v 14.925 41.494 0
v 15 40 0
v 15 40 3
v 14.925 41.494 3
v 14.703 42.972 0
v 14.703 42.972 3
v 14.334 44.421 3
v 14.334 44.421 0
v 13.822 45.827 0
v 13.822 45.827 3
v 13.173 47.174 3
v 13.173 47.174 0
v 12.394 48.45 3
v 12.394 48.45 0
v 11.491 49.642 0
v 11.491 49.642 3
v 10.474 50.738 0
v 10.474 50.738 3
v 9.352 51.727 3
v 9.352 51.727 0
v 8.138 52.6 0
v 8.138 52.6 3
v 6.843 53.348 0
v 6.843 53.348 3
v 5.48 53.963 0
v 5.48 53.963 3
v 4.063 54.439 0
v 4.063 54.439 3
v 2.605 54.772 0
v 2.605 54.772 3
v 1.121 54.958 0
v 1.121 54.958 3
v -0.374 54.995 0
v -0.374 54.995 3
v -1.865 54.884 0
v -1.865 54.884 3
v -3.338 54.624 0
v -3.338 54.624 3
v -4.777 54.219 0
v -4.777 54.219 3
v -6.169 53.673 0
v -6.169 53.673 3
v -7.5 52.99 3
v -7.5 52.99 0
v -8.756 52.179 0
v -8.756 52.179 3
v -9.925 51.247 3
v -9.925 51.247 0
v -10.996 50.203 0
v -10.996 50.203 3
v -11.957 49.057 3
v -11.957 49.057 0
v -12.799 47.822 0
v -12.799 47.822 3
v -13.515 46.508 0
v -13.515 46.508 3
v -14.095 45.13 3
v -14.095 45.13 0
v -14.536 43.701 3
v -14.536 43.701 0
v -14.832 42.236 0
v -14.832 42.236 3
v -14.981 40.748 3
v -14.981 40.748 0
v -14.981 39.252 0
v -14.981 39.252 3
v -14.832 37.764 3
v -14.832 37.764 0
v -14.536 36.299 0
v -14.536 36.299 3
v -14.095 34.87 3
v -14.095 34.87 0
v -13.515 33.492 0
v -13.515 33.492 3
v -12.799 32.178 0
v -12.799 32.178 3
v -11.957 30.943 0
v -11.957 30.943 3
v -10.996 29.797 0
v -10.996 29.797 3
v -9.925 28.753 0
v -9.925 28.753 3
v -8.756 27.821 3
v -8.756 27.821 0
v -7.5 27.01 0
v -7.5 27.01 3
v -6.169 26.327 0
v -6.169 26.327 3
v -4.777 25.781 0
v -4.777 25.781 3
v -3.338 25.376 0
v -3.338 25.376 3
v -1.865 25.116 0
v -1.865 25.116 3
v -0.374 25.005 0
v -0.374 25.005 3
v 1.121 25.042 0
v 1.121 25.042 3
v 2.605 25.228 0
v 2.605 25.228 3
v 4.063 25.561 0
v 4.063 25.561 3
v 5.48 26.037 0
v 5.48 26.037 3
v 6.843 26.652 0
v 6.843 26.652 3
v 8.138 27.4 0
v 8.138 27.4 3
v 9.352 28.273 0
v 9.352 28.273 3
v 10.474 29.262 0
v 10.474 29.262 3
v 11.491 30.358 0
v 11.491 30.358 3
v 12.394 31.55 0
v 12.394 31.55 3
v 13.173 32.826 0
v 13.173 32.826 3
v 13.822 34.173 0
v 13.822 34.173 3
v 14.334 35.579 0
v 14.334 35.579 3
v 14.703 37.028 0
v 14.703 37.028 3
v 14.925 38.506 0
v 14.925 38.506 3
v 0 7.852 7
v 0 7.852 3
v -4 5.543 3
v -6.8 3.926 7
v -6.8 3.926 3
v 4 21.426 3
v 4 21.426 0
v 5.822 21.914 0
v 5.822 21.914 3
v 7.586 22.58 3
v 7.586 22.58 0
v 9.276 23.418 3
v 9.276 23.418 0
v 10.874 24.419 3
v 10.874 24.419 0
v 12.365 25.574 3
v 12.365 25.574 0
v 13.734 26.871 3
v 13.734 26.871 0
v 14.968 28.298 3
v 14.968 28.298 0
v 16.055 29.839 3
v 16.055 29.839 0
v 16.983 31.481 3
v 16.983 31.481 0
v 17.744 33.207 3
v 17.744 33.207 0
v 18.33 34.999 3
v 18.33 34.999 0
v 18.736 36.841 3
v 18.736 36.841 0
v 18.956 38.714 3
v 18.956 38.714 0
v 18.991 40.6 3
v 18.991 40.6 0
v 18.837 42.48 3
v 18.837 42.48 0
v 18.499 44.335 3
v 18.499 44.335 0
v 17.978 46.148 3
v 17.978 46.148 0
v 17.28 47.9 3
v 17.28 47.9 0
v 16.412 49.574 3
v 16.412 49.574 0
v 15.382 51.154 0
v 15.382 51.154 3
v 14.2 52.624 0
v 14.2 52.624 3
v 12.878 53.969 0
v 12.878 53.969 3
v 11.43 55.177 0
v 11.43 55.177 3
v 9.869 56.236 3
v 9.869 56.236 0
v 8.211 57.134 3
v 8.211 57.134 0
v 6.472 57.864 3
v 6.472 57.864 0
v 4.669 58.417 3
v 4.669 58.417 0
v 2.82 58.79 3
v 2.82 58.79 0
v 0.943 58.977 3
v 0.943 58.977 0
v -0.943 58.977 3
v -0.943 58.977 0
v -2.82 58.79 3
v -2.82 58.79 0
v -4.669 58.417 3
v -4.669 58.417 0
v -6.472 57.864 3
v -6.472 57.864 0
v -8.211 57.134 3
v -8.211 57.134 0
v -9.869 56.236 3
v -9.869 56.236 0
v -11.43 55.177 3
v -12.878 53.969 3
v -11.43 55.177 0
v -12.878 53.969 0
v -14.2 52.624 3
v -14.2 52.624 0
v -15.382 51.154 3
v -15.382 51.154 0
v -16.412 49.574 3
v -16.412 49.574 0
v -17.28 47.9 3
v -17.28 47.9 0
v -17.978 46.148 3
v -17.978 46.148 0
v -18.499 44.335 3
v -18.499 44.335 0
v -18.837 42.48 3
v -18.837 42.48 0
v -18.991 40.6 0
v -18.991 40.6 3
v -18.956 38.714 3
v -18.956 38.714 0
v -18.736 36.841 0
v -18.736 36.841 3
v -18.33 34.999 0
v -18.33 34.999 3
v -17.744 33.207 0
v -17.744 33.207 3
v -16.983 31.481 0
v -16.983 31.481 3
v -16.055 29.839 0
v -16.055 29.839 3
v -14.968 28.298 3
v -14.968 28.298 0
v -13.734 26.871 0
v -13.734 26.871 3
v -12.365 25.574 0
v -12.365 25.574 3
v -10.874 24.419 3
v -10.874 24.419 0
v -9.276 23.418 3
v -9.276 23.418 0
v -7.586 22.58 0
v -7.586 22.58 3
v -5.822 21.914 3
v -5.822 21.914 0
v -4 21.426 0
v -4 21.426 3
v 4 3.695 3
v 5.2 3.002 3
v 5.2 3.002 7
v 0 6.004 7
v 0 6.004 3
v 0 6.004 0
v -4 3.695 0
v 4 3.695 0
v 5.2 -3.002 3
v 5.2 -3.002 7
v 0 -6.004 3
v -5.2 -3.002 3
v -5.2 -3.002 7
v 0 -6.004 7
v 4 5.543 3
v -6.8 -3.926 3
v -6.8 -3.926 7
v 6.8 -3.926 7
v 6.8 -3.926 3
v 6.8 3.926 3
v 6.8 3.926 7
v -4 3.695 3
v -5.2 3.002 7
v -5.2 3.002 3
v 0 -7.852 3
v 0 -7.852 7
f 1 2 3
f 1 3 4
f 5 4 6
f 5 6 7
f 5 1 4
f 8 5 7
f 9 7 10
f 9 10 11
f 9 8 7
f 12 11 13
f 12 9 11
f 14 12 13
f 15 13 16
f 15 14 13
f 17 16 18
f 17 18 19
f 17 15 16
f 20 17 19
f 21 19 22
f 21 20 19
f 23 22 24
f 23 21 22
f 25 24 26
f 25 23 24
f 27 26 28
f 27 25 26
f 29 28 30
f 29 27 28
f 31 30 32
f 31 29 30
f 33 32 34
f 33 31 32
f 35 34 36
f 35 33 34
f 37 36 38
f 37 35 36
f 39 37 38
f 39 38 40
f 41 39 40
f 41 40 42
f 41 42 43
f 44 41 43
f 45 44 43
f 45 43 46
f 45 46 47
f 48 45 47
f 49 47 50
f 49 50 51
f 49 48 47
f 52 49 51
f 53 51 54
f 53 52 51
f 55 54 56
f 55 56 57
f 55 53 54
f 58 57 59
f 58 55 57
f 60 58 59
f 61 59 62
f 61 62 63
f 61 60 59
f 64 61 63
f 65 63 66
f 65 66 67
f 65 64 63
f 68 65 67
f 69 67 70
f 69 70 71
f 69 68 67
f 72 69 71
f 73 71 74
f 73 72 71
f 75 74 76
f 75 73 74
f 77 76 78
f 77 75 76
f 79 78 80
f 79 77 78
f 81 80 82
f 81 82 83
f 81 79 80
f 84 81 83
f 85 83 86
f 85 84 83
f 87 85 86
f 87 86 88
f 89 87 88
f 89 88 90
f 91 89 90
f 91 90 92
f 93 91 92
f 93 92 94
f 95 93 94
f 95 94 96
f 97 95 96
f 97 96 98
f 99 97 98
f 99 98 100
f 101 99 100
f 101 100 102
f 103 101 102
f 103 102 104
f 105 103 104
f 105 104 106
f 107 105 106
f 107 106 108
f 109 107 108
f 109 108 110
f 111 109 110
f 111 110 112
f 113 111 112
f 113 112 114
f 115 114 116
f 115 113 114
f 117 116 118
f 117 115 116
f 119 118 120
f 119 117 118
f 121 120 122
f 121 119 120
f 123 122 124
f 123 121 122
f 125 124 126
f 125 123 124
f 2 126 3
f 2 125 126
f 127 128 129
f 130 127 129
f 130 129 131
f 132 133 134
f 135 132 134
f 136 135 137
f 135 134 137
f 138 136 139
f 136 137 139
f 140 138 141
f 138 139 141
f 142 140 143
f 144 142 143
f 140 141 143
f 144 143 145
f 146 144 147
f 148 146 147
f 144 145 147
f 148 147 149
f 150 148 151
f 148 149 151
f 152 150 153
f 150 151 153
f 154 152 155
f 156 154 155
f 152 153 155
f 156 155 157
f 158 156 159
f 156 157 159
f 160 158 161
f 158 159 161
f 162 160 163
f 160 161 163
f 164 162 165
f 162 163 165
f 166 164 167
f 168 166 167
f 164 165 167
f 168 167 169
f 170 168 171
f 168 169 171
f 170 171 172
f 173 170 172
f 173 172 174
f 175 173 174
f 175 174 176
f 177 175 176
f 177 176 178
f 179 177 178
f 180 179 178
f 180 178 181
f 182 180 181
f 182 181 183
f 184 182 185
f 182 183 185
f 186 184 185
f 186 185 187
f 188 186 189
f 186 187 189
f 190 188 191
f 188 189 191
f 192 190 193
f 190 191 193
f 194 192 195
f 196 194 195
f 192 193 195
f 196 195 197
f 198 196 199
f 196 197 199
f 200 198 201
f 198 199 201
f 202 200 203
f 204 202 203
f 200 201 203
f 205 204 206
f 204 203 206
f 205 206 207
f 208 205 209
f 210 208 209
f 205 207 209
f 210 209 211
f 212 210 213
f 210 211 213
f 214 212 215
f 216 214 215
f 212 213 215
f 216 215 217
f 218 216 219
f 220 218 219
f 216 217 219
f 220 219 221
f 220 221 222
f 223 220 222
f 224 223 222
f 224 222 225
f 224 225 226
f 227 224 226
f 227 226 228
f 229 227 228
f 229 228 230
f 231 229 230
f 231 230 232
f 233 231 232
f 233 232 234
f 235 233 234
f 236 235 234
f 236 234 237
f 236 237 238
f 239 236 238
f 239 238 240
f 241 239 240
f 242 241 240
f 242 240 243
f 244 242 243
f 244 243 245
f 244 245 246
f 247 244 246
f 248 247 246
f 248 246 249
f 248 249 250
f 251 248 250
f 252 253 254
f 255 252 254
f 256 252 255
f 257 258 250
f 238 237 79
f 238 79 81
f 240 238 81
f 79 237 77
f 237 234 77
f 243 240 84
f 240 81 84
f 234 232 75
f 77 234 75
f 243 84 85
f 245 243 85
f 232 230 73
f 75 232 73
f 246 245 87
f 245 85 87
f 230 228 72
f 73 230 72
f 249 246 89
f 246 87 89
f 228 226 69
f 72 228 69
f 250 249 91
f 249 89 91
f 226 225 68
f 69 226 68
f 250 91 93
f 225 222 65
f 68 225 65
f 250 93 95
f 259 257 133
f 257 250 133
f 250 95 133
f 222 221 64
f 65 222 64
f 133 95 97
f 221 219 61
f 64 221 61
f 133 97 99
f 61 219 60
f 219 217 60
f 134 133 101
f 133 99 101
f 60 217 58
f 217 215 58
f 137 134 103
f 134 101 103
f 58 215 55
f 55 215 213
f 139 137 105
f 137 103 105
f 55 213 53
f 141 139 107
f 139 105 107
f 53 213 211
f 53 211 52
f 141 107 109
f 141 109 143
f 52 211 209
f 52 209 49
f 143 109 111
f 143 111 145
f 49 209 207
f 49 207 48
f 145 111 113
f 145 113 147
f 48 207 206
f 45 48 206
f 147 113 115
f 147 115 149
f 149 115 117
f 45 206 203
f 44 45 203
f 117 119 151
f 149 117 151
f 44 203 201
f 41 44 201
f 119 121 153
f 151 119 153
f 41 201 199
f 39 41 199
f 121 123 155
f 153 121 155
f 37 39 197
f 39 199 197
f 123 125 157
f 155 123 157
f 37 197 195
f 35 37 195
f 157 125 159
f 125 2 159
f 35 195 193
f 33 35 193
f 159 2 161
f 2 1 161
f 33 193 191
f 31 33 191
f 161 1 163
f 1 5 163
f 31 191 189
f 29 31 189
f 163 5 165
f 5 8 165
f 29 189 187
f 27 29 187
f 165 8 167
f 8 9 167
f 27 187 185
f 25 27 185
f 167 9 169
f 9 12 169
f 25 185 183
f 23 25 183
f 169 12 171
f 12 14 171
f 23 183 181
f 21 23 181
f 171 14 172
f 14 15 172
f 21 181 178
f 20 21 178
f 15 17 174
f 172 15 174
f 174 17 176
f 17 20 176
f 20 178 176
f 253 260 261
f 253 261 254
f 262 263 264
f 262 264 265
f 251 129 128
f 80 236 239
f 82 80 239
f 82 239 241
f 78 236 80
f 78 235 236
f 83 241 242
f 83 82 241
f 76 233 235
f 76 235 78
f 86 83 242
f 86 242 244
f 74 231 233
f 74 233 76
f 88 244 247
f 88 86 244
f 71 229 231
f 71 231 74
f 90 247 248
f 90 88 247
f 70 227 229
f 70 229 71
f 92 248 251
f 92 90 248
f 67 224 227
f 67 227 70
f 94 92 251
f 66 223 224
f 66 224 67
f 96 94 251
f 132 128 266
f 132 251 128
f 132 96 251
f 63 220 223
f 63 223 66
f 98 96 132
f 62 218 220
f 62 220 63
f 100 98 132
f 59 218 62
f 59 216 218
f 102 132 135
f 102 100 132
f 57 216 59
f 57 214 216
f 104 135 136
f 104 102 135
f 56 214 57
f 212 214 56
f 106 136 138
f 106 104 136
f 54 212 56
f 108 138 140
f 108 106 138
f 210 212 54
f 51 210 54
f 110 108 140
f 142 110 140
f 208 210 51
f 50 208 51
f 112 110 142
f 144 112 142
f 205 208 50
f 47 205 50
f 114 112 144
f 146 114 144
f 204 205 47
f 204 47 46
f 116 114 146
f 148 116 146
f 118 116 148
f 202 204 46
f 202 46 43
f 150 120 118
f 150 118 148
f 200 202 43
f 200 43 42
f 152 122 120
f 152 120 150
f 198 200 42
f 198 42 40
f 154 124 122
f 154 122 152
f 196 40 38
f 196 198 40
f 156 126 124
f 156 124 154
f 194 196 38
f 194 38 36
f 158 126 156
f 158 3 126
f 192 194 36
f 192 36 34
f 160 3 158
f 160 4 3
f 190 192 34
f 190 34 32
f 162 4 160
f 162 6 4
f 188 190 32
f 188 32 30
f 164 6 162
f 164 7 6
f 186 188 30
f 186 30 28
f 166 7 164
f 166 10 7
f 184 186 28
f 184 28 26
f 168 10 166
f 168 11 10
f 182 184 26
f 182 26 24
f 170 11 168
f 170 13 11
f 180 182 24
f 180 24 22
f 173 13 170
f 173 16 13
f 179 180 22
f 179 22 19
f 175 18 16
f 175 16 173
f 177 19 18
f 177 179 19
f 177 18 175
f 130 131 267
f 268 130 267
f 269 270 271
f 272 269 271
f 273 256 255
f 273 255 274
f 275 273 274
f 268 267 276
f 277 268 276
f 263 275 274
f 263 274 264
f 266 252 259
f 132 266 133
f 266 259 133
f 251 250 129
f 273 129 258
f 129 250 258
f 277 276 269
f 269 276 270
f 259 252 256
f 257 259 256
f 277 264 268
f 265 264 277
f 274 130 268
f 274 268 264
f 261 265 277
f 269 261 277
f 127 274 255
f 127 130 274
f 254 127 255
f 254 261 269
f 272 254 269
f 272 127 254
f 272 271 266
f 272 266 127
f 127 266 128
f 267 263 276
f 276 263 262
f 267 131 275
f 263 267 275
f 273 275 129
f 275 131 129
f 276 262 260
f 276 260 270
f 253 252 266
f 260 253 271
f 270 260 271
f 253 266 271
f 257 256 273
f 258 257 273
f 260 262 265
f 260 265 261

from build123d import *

# Parameters (mm, degrees)
SKETCH1_R           = 19
SKETCH1_R_2         = 15
BOSS_EXTRUDE1_DEPTH = 3
BOSS_EXTRUDE2_DEPTH = 4
CUT_EXTRUDE1_DEPTH  = 4


with BuildPart() as part:
    # Sketch1 → Boss-Extrude1 (new body)
    with BuildSketch(Plane.XY):
        Polygon((5, -2.886751346), (5, 2.886751346), (0, 5.773502692), (-5, 2.886751346), (-5, -2.886751346), (0, -5.773502692), align=None)
        with BuildLine():
            Line((-4, 3.464101615), (0, 5.773502692))
            Line((0, 5.773502692), (4, 3.464101615))
            Line((4, 3.464101615), (4, 21.425824379))
            ThreePointArc((4, 21.425824379), (0, 21), (-4, 21.425824379))
            Line((-4, 21.425824379), (-4, 3.464101615))
        make_face()
        with Locations((0, 40)):
            Circle(SKETCH1_R)
        with Locations((0, 40)):
            Circle(SKETCH1_R_2, mode=Mode.SUBTRACT)
    extrude(amount=BOSS_EXTRUDE1_DEPTH)

    # Sketch2 → Boss-Extrude2 (add)
    with BuildSketch(Plane.XY.offset(3)):
        Polygon((0, -7.851963661), (6.8, -3.92598183), (6.8, 3.92598183), (0, 7.851963661), (-6.8, 3.92598183), (-6.8, -3.92598183), align=None)
        Polygon((0, -6.0044428), (5.2, -3.0022214), (5.2, 3.0022214), (0, 6.0044428), (-5.2, 3.0022214), (-5.2, -3.0022214), align=None, mode=Mode.SUBTRACT)
    extrude(amount=BOSS_EXTRUDE2_DEPTH)

    # Sketch3 → Cut-Extrude1 (cut, through all)
    with BuildSketch(Plane.XY.offset(3)):
        Polygon((4, 3.464101615), (4, 3.695041723), (0, 6.0044428), (-4, 3.695041723), (-4, 3.464101615), (-5, 2.886751346), (-5, -2.886751346), (0, -5.773502692), (5, -2.886751346), (5, 2.886751346), align=None)
    extrude(amount=-CUT_EXTRUDE1_DEPTH, mode=Mode.SUBTRACT)


solid = part.part
